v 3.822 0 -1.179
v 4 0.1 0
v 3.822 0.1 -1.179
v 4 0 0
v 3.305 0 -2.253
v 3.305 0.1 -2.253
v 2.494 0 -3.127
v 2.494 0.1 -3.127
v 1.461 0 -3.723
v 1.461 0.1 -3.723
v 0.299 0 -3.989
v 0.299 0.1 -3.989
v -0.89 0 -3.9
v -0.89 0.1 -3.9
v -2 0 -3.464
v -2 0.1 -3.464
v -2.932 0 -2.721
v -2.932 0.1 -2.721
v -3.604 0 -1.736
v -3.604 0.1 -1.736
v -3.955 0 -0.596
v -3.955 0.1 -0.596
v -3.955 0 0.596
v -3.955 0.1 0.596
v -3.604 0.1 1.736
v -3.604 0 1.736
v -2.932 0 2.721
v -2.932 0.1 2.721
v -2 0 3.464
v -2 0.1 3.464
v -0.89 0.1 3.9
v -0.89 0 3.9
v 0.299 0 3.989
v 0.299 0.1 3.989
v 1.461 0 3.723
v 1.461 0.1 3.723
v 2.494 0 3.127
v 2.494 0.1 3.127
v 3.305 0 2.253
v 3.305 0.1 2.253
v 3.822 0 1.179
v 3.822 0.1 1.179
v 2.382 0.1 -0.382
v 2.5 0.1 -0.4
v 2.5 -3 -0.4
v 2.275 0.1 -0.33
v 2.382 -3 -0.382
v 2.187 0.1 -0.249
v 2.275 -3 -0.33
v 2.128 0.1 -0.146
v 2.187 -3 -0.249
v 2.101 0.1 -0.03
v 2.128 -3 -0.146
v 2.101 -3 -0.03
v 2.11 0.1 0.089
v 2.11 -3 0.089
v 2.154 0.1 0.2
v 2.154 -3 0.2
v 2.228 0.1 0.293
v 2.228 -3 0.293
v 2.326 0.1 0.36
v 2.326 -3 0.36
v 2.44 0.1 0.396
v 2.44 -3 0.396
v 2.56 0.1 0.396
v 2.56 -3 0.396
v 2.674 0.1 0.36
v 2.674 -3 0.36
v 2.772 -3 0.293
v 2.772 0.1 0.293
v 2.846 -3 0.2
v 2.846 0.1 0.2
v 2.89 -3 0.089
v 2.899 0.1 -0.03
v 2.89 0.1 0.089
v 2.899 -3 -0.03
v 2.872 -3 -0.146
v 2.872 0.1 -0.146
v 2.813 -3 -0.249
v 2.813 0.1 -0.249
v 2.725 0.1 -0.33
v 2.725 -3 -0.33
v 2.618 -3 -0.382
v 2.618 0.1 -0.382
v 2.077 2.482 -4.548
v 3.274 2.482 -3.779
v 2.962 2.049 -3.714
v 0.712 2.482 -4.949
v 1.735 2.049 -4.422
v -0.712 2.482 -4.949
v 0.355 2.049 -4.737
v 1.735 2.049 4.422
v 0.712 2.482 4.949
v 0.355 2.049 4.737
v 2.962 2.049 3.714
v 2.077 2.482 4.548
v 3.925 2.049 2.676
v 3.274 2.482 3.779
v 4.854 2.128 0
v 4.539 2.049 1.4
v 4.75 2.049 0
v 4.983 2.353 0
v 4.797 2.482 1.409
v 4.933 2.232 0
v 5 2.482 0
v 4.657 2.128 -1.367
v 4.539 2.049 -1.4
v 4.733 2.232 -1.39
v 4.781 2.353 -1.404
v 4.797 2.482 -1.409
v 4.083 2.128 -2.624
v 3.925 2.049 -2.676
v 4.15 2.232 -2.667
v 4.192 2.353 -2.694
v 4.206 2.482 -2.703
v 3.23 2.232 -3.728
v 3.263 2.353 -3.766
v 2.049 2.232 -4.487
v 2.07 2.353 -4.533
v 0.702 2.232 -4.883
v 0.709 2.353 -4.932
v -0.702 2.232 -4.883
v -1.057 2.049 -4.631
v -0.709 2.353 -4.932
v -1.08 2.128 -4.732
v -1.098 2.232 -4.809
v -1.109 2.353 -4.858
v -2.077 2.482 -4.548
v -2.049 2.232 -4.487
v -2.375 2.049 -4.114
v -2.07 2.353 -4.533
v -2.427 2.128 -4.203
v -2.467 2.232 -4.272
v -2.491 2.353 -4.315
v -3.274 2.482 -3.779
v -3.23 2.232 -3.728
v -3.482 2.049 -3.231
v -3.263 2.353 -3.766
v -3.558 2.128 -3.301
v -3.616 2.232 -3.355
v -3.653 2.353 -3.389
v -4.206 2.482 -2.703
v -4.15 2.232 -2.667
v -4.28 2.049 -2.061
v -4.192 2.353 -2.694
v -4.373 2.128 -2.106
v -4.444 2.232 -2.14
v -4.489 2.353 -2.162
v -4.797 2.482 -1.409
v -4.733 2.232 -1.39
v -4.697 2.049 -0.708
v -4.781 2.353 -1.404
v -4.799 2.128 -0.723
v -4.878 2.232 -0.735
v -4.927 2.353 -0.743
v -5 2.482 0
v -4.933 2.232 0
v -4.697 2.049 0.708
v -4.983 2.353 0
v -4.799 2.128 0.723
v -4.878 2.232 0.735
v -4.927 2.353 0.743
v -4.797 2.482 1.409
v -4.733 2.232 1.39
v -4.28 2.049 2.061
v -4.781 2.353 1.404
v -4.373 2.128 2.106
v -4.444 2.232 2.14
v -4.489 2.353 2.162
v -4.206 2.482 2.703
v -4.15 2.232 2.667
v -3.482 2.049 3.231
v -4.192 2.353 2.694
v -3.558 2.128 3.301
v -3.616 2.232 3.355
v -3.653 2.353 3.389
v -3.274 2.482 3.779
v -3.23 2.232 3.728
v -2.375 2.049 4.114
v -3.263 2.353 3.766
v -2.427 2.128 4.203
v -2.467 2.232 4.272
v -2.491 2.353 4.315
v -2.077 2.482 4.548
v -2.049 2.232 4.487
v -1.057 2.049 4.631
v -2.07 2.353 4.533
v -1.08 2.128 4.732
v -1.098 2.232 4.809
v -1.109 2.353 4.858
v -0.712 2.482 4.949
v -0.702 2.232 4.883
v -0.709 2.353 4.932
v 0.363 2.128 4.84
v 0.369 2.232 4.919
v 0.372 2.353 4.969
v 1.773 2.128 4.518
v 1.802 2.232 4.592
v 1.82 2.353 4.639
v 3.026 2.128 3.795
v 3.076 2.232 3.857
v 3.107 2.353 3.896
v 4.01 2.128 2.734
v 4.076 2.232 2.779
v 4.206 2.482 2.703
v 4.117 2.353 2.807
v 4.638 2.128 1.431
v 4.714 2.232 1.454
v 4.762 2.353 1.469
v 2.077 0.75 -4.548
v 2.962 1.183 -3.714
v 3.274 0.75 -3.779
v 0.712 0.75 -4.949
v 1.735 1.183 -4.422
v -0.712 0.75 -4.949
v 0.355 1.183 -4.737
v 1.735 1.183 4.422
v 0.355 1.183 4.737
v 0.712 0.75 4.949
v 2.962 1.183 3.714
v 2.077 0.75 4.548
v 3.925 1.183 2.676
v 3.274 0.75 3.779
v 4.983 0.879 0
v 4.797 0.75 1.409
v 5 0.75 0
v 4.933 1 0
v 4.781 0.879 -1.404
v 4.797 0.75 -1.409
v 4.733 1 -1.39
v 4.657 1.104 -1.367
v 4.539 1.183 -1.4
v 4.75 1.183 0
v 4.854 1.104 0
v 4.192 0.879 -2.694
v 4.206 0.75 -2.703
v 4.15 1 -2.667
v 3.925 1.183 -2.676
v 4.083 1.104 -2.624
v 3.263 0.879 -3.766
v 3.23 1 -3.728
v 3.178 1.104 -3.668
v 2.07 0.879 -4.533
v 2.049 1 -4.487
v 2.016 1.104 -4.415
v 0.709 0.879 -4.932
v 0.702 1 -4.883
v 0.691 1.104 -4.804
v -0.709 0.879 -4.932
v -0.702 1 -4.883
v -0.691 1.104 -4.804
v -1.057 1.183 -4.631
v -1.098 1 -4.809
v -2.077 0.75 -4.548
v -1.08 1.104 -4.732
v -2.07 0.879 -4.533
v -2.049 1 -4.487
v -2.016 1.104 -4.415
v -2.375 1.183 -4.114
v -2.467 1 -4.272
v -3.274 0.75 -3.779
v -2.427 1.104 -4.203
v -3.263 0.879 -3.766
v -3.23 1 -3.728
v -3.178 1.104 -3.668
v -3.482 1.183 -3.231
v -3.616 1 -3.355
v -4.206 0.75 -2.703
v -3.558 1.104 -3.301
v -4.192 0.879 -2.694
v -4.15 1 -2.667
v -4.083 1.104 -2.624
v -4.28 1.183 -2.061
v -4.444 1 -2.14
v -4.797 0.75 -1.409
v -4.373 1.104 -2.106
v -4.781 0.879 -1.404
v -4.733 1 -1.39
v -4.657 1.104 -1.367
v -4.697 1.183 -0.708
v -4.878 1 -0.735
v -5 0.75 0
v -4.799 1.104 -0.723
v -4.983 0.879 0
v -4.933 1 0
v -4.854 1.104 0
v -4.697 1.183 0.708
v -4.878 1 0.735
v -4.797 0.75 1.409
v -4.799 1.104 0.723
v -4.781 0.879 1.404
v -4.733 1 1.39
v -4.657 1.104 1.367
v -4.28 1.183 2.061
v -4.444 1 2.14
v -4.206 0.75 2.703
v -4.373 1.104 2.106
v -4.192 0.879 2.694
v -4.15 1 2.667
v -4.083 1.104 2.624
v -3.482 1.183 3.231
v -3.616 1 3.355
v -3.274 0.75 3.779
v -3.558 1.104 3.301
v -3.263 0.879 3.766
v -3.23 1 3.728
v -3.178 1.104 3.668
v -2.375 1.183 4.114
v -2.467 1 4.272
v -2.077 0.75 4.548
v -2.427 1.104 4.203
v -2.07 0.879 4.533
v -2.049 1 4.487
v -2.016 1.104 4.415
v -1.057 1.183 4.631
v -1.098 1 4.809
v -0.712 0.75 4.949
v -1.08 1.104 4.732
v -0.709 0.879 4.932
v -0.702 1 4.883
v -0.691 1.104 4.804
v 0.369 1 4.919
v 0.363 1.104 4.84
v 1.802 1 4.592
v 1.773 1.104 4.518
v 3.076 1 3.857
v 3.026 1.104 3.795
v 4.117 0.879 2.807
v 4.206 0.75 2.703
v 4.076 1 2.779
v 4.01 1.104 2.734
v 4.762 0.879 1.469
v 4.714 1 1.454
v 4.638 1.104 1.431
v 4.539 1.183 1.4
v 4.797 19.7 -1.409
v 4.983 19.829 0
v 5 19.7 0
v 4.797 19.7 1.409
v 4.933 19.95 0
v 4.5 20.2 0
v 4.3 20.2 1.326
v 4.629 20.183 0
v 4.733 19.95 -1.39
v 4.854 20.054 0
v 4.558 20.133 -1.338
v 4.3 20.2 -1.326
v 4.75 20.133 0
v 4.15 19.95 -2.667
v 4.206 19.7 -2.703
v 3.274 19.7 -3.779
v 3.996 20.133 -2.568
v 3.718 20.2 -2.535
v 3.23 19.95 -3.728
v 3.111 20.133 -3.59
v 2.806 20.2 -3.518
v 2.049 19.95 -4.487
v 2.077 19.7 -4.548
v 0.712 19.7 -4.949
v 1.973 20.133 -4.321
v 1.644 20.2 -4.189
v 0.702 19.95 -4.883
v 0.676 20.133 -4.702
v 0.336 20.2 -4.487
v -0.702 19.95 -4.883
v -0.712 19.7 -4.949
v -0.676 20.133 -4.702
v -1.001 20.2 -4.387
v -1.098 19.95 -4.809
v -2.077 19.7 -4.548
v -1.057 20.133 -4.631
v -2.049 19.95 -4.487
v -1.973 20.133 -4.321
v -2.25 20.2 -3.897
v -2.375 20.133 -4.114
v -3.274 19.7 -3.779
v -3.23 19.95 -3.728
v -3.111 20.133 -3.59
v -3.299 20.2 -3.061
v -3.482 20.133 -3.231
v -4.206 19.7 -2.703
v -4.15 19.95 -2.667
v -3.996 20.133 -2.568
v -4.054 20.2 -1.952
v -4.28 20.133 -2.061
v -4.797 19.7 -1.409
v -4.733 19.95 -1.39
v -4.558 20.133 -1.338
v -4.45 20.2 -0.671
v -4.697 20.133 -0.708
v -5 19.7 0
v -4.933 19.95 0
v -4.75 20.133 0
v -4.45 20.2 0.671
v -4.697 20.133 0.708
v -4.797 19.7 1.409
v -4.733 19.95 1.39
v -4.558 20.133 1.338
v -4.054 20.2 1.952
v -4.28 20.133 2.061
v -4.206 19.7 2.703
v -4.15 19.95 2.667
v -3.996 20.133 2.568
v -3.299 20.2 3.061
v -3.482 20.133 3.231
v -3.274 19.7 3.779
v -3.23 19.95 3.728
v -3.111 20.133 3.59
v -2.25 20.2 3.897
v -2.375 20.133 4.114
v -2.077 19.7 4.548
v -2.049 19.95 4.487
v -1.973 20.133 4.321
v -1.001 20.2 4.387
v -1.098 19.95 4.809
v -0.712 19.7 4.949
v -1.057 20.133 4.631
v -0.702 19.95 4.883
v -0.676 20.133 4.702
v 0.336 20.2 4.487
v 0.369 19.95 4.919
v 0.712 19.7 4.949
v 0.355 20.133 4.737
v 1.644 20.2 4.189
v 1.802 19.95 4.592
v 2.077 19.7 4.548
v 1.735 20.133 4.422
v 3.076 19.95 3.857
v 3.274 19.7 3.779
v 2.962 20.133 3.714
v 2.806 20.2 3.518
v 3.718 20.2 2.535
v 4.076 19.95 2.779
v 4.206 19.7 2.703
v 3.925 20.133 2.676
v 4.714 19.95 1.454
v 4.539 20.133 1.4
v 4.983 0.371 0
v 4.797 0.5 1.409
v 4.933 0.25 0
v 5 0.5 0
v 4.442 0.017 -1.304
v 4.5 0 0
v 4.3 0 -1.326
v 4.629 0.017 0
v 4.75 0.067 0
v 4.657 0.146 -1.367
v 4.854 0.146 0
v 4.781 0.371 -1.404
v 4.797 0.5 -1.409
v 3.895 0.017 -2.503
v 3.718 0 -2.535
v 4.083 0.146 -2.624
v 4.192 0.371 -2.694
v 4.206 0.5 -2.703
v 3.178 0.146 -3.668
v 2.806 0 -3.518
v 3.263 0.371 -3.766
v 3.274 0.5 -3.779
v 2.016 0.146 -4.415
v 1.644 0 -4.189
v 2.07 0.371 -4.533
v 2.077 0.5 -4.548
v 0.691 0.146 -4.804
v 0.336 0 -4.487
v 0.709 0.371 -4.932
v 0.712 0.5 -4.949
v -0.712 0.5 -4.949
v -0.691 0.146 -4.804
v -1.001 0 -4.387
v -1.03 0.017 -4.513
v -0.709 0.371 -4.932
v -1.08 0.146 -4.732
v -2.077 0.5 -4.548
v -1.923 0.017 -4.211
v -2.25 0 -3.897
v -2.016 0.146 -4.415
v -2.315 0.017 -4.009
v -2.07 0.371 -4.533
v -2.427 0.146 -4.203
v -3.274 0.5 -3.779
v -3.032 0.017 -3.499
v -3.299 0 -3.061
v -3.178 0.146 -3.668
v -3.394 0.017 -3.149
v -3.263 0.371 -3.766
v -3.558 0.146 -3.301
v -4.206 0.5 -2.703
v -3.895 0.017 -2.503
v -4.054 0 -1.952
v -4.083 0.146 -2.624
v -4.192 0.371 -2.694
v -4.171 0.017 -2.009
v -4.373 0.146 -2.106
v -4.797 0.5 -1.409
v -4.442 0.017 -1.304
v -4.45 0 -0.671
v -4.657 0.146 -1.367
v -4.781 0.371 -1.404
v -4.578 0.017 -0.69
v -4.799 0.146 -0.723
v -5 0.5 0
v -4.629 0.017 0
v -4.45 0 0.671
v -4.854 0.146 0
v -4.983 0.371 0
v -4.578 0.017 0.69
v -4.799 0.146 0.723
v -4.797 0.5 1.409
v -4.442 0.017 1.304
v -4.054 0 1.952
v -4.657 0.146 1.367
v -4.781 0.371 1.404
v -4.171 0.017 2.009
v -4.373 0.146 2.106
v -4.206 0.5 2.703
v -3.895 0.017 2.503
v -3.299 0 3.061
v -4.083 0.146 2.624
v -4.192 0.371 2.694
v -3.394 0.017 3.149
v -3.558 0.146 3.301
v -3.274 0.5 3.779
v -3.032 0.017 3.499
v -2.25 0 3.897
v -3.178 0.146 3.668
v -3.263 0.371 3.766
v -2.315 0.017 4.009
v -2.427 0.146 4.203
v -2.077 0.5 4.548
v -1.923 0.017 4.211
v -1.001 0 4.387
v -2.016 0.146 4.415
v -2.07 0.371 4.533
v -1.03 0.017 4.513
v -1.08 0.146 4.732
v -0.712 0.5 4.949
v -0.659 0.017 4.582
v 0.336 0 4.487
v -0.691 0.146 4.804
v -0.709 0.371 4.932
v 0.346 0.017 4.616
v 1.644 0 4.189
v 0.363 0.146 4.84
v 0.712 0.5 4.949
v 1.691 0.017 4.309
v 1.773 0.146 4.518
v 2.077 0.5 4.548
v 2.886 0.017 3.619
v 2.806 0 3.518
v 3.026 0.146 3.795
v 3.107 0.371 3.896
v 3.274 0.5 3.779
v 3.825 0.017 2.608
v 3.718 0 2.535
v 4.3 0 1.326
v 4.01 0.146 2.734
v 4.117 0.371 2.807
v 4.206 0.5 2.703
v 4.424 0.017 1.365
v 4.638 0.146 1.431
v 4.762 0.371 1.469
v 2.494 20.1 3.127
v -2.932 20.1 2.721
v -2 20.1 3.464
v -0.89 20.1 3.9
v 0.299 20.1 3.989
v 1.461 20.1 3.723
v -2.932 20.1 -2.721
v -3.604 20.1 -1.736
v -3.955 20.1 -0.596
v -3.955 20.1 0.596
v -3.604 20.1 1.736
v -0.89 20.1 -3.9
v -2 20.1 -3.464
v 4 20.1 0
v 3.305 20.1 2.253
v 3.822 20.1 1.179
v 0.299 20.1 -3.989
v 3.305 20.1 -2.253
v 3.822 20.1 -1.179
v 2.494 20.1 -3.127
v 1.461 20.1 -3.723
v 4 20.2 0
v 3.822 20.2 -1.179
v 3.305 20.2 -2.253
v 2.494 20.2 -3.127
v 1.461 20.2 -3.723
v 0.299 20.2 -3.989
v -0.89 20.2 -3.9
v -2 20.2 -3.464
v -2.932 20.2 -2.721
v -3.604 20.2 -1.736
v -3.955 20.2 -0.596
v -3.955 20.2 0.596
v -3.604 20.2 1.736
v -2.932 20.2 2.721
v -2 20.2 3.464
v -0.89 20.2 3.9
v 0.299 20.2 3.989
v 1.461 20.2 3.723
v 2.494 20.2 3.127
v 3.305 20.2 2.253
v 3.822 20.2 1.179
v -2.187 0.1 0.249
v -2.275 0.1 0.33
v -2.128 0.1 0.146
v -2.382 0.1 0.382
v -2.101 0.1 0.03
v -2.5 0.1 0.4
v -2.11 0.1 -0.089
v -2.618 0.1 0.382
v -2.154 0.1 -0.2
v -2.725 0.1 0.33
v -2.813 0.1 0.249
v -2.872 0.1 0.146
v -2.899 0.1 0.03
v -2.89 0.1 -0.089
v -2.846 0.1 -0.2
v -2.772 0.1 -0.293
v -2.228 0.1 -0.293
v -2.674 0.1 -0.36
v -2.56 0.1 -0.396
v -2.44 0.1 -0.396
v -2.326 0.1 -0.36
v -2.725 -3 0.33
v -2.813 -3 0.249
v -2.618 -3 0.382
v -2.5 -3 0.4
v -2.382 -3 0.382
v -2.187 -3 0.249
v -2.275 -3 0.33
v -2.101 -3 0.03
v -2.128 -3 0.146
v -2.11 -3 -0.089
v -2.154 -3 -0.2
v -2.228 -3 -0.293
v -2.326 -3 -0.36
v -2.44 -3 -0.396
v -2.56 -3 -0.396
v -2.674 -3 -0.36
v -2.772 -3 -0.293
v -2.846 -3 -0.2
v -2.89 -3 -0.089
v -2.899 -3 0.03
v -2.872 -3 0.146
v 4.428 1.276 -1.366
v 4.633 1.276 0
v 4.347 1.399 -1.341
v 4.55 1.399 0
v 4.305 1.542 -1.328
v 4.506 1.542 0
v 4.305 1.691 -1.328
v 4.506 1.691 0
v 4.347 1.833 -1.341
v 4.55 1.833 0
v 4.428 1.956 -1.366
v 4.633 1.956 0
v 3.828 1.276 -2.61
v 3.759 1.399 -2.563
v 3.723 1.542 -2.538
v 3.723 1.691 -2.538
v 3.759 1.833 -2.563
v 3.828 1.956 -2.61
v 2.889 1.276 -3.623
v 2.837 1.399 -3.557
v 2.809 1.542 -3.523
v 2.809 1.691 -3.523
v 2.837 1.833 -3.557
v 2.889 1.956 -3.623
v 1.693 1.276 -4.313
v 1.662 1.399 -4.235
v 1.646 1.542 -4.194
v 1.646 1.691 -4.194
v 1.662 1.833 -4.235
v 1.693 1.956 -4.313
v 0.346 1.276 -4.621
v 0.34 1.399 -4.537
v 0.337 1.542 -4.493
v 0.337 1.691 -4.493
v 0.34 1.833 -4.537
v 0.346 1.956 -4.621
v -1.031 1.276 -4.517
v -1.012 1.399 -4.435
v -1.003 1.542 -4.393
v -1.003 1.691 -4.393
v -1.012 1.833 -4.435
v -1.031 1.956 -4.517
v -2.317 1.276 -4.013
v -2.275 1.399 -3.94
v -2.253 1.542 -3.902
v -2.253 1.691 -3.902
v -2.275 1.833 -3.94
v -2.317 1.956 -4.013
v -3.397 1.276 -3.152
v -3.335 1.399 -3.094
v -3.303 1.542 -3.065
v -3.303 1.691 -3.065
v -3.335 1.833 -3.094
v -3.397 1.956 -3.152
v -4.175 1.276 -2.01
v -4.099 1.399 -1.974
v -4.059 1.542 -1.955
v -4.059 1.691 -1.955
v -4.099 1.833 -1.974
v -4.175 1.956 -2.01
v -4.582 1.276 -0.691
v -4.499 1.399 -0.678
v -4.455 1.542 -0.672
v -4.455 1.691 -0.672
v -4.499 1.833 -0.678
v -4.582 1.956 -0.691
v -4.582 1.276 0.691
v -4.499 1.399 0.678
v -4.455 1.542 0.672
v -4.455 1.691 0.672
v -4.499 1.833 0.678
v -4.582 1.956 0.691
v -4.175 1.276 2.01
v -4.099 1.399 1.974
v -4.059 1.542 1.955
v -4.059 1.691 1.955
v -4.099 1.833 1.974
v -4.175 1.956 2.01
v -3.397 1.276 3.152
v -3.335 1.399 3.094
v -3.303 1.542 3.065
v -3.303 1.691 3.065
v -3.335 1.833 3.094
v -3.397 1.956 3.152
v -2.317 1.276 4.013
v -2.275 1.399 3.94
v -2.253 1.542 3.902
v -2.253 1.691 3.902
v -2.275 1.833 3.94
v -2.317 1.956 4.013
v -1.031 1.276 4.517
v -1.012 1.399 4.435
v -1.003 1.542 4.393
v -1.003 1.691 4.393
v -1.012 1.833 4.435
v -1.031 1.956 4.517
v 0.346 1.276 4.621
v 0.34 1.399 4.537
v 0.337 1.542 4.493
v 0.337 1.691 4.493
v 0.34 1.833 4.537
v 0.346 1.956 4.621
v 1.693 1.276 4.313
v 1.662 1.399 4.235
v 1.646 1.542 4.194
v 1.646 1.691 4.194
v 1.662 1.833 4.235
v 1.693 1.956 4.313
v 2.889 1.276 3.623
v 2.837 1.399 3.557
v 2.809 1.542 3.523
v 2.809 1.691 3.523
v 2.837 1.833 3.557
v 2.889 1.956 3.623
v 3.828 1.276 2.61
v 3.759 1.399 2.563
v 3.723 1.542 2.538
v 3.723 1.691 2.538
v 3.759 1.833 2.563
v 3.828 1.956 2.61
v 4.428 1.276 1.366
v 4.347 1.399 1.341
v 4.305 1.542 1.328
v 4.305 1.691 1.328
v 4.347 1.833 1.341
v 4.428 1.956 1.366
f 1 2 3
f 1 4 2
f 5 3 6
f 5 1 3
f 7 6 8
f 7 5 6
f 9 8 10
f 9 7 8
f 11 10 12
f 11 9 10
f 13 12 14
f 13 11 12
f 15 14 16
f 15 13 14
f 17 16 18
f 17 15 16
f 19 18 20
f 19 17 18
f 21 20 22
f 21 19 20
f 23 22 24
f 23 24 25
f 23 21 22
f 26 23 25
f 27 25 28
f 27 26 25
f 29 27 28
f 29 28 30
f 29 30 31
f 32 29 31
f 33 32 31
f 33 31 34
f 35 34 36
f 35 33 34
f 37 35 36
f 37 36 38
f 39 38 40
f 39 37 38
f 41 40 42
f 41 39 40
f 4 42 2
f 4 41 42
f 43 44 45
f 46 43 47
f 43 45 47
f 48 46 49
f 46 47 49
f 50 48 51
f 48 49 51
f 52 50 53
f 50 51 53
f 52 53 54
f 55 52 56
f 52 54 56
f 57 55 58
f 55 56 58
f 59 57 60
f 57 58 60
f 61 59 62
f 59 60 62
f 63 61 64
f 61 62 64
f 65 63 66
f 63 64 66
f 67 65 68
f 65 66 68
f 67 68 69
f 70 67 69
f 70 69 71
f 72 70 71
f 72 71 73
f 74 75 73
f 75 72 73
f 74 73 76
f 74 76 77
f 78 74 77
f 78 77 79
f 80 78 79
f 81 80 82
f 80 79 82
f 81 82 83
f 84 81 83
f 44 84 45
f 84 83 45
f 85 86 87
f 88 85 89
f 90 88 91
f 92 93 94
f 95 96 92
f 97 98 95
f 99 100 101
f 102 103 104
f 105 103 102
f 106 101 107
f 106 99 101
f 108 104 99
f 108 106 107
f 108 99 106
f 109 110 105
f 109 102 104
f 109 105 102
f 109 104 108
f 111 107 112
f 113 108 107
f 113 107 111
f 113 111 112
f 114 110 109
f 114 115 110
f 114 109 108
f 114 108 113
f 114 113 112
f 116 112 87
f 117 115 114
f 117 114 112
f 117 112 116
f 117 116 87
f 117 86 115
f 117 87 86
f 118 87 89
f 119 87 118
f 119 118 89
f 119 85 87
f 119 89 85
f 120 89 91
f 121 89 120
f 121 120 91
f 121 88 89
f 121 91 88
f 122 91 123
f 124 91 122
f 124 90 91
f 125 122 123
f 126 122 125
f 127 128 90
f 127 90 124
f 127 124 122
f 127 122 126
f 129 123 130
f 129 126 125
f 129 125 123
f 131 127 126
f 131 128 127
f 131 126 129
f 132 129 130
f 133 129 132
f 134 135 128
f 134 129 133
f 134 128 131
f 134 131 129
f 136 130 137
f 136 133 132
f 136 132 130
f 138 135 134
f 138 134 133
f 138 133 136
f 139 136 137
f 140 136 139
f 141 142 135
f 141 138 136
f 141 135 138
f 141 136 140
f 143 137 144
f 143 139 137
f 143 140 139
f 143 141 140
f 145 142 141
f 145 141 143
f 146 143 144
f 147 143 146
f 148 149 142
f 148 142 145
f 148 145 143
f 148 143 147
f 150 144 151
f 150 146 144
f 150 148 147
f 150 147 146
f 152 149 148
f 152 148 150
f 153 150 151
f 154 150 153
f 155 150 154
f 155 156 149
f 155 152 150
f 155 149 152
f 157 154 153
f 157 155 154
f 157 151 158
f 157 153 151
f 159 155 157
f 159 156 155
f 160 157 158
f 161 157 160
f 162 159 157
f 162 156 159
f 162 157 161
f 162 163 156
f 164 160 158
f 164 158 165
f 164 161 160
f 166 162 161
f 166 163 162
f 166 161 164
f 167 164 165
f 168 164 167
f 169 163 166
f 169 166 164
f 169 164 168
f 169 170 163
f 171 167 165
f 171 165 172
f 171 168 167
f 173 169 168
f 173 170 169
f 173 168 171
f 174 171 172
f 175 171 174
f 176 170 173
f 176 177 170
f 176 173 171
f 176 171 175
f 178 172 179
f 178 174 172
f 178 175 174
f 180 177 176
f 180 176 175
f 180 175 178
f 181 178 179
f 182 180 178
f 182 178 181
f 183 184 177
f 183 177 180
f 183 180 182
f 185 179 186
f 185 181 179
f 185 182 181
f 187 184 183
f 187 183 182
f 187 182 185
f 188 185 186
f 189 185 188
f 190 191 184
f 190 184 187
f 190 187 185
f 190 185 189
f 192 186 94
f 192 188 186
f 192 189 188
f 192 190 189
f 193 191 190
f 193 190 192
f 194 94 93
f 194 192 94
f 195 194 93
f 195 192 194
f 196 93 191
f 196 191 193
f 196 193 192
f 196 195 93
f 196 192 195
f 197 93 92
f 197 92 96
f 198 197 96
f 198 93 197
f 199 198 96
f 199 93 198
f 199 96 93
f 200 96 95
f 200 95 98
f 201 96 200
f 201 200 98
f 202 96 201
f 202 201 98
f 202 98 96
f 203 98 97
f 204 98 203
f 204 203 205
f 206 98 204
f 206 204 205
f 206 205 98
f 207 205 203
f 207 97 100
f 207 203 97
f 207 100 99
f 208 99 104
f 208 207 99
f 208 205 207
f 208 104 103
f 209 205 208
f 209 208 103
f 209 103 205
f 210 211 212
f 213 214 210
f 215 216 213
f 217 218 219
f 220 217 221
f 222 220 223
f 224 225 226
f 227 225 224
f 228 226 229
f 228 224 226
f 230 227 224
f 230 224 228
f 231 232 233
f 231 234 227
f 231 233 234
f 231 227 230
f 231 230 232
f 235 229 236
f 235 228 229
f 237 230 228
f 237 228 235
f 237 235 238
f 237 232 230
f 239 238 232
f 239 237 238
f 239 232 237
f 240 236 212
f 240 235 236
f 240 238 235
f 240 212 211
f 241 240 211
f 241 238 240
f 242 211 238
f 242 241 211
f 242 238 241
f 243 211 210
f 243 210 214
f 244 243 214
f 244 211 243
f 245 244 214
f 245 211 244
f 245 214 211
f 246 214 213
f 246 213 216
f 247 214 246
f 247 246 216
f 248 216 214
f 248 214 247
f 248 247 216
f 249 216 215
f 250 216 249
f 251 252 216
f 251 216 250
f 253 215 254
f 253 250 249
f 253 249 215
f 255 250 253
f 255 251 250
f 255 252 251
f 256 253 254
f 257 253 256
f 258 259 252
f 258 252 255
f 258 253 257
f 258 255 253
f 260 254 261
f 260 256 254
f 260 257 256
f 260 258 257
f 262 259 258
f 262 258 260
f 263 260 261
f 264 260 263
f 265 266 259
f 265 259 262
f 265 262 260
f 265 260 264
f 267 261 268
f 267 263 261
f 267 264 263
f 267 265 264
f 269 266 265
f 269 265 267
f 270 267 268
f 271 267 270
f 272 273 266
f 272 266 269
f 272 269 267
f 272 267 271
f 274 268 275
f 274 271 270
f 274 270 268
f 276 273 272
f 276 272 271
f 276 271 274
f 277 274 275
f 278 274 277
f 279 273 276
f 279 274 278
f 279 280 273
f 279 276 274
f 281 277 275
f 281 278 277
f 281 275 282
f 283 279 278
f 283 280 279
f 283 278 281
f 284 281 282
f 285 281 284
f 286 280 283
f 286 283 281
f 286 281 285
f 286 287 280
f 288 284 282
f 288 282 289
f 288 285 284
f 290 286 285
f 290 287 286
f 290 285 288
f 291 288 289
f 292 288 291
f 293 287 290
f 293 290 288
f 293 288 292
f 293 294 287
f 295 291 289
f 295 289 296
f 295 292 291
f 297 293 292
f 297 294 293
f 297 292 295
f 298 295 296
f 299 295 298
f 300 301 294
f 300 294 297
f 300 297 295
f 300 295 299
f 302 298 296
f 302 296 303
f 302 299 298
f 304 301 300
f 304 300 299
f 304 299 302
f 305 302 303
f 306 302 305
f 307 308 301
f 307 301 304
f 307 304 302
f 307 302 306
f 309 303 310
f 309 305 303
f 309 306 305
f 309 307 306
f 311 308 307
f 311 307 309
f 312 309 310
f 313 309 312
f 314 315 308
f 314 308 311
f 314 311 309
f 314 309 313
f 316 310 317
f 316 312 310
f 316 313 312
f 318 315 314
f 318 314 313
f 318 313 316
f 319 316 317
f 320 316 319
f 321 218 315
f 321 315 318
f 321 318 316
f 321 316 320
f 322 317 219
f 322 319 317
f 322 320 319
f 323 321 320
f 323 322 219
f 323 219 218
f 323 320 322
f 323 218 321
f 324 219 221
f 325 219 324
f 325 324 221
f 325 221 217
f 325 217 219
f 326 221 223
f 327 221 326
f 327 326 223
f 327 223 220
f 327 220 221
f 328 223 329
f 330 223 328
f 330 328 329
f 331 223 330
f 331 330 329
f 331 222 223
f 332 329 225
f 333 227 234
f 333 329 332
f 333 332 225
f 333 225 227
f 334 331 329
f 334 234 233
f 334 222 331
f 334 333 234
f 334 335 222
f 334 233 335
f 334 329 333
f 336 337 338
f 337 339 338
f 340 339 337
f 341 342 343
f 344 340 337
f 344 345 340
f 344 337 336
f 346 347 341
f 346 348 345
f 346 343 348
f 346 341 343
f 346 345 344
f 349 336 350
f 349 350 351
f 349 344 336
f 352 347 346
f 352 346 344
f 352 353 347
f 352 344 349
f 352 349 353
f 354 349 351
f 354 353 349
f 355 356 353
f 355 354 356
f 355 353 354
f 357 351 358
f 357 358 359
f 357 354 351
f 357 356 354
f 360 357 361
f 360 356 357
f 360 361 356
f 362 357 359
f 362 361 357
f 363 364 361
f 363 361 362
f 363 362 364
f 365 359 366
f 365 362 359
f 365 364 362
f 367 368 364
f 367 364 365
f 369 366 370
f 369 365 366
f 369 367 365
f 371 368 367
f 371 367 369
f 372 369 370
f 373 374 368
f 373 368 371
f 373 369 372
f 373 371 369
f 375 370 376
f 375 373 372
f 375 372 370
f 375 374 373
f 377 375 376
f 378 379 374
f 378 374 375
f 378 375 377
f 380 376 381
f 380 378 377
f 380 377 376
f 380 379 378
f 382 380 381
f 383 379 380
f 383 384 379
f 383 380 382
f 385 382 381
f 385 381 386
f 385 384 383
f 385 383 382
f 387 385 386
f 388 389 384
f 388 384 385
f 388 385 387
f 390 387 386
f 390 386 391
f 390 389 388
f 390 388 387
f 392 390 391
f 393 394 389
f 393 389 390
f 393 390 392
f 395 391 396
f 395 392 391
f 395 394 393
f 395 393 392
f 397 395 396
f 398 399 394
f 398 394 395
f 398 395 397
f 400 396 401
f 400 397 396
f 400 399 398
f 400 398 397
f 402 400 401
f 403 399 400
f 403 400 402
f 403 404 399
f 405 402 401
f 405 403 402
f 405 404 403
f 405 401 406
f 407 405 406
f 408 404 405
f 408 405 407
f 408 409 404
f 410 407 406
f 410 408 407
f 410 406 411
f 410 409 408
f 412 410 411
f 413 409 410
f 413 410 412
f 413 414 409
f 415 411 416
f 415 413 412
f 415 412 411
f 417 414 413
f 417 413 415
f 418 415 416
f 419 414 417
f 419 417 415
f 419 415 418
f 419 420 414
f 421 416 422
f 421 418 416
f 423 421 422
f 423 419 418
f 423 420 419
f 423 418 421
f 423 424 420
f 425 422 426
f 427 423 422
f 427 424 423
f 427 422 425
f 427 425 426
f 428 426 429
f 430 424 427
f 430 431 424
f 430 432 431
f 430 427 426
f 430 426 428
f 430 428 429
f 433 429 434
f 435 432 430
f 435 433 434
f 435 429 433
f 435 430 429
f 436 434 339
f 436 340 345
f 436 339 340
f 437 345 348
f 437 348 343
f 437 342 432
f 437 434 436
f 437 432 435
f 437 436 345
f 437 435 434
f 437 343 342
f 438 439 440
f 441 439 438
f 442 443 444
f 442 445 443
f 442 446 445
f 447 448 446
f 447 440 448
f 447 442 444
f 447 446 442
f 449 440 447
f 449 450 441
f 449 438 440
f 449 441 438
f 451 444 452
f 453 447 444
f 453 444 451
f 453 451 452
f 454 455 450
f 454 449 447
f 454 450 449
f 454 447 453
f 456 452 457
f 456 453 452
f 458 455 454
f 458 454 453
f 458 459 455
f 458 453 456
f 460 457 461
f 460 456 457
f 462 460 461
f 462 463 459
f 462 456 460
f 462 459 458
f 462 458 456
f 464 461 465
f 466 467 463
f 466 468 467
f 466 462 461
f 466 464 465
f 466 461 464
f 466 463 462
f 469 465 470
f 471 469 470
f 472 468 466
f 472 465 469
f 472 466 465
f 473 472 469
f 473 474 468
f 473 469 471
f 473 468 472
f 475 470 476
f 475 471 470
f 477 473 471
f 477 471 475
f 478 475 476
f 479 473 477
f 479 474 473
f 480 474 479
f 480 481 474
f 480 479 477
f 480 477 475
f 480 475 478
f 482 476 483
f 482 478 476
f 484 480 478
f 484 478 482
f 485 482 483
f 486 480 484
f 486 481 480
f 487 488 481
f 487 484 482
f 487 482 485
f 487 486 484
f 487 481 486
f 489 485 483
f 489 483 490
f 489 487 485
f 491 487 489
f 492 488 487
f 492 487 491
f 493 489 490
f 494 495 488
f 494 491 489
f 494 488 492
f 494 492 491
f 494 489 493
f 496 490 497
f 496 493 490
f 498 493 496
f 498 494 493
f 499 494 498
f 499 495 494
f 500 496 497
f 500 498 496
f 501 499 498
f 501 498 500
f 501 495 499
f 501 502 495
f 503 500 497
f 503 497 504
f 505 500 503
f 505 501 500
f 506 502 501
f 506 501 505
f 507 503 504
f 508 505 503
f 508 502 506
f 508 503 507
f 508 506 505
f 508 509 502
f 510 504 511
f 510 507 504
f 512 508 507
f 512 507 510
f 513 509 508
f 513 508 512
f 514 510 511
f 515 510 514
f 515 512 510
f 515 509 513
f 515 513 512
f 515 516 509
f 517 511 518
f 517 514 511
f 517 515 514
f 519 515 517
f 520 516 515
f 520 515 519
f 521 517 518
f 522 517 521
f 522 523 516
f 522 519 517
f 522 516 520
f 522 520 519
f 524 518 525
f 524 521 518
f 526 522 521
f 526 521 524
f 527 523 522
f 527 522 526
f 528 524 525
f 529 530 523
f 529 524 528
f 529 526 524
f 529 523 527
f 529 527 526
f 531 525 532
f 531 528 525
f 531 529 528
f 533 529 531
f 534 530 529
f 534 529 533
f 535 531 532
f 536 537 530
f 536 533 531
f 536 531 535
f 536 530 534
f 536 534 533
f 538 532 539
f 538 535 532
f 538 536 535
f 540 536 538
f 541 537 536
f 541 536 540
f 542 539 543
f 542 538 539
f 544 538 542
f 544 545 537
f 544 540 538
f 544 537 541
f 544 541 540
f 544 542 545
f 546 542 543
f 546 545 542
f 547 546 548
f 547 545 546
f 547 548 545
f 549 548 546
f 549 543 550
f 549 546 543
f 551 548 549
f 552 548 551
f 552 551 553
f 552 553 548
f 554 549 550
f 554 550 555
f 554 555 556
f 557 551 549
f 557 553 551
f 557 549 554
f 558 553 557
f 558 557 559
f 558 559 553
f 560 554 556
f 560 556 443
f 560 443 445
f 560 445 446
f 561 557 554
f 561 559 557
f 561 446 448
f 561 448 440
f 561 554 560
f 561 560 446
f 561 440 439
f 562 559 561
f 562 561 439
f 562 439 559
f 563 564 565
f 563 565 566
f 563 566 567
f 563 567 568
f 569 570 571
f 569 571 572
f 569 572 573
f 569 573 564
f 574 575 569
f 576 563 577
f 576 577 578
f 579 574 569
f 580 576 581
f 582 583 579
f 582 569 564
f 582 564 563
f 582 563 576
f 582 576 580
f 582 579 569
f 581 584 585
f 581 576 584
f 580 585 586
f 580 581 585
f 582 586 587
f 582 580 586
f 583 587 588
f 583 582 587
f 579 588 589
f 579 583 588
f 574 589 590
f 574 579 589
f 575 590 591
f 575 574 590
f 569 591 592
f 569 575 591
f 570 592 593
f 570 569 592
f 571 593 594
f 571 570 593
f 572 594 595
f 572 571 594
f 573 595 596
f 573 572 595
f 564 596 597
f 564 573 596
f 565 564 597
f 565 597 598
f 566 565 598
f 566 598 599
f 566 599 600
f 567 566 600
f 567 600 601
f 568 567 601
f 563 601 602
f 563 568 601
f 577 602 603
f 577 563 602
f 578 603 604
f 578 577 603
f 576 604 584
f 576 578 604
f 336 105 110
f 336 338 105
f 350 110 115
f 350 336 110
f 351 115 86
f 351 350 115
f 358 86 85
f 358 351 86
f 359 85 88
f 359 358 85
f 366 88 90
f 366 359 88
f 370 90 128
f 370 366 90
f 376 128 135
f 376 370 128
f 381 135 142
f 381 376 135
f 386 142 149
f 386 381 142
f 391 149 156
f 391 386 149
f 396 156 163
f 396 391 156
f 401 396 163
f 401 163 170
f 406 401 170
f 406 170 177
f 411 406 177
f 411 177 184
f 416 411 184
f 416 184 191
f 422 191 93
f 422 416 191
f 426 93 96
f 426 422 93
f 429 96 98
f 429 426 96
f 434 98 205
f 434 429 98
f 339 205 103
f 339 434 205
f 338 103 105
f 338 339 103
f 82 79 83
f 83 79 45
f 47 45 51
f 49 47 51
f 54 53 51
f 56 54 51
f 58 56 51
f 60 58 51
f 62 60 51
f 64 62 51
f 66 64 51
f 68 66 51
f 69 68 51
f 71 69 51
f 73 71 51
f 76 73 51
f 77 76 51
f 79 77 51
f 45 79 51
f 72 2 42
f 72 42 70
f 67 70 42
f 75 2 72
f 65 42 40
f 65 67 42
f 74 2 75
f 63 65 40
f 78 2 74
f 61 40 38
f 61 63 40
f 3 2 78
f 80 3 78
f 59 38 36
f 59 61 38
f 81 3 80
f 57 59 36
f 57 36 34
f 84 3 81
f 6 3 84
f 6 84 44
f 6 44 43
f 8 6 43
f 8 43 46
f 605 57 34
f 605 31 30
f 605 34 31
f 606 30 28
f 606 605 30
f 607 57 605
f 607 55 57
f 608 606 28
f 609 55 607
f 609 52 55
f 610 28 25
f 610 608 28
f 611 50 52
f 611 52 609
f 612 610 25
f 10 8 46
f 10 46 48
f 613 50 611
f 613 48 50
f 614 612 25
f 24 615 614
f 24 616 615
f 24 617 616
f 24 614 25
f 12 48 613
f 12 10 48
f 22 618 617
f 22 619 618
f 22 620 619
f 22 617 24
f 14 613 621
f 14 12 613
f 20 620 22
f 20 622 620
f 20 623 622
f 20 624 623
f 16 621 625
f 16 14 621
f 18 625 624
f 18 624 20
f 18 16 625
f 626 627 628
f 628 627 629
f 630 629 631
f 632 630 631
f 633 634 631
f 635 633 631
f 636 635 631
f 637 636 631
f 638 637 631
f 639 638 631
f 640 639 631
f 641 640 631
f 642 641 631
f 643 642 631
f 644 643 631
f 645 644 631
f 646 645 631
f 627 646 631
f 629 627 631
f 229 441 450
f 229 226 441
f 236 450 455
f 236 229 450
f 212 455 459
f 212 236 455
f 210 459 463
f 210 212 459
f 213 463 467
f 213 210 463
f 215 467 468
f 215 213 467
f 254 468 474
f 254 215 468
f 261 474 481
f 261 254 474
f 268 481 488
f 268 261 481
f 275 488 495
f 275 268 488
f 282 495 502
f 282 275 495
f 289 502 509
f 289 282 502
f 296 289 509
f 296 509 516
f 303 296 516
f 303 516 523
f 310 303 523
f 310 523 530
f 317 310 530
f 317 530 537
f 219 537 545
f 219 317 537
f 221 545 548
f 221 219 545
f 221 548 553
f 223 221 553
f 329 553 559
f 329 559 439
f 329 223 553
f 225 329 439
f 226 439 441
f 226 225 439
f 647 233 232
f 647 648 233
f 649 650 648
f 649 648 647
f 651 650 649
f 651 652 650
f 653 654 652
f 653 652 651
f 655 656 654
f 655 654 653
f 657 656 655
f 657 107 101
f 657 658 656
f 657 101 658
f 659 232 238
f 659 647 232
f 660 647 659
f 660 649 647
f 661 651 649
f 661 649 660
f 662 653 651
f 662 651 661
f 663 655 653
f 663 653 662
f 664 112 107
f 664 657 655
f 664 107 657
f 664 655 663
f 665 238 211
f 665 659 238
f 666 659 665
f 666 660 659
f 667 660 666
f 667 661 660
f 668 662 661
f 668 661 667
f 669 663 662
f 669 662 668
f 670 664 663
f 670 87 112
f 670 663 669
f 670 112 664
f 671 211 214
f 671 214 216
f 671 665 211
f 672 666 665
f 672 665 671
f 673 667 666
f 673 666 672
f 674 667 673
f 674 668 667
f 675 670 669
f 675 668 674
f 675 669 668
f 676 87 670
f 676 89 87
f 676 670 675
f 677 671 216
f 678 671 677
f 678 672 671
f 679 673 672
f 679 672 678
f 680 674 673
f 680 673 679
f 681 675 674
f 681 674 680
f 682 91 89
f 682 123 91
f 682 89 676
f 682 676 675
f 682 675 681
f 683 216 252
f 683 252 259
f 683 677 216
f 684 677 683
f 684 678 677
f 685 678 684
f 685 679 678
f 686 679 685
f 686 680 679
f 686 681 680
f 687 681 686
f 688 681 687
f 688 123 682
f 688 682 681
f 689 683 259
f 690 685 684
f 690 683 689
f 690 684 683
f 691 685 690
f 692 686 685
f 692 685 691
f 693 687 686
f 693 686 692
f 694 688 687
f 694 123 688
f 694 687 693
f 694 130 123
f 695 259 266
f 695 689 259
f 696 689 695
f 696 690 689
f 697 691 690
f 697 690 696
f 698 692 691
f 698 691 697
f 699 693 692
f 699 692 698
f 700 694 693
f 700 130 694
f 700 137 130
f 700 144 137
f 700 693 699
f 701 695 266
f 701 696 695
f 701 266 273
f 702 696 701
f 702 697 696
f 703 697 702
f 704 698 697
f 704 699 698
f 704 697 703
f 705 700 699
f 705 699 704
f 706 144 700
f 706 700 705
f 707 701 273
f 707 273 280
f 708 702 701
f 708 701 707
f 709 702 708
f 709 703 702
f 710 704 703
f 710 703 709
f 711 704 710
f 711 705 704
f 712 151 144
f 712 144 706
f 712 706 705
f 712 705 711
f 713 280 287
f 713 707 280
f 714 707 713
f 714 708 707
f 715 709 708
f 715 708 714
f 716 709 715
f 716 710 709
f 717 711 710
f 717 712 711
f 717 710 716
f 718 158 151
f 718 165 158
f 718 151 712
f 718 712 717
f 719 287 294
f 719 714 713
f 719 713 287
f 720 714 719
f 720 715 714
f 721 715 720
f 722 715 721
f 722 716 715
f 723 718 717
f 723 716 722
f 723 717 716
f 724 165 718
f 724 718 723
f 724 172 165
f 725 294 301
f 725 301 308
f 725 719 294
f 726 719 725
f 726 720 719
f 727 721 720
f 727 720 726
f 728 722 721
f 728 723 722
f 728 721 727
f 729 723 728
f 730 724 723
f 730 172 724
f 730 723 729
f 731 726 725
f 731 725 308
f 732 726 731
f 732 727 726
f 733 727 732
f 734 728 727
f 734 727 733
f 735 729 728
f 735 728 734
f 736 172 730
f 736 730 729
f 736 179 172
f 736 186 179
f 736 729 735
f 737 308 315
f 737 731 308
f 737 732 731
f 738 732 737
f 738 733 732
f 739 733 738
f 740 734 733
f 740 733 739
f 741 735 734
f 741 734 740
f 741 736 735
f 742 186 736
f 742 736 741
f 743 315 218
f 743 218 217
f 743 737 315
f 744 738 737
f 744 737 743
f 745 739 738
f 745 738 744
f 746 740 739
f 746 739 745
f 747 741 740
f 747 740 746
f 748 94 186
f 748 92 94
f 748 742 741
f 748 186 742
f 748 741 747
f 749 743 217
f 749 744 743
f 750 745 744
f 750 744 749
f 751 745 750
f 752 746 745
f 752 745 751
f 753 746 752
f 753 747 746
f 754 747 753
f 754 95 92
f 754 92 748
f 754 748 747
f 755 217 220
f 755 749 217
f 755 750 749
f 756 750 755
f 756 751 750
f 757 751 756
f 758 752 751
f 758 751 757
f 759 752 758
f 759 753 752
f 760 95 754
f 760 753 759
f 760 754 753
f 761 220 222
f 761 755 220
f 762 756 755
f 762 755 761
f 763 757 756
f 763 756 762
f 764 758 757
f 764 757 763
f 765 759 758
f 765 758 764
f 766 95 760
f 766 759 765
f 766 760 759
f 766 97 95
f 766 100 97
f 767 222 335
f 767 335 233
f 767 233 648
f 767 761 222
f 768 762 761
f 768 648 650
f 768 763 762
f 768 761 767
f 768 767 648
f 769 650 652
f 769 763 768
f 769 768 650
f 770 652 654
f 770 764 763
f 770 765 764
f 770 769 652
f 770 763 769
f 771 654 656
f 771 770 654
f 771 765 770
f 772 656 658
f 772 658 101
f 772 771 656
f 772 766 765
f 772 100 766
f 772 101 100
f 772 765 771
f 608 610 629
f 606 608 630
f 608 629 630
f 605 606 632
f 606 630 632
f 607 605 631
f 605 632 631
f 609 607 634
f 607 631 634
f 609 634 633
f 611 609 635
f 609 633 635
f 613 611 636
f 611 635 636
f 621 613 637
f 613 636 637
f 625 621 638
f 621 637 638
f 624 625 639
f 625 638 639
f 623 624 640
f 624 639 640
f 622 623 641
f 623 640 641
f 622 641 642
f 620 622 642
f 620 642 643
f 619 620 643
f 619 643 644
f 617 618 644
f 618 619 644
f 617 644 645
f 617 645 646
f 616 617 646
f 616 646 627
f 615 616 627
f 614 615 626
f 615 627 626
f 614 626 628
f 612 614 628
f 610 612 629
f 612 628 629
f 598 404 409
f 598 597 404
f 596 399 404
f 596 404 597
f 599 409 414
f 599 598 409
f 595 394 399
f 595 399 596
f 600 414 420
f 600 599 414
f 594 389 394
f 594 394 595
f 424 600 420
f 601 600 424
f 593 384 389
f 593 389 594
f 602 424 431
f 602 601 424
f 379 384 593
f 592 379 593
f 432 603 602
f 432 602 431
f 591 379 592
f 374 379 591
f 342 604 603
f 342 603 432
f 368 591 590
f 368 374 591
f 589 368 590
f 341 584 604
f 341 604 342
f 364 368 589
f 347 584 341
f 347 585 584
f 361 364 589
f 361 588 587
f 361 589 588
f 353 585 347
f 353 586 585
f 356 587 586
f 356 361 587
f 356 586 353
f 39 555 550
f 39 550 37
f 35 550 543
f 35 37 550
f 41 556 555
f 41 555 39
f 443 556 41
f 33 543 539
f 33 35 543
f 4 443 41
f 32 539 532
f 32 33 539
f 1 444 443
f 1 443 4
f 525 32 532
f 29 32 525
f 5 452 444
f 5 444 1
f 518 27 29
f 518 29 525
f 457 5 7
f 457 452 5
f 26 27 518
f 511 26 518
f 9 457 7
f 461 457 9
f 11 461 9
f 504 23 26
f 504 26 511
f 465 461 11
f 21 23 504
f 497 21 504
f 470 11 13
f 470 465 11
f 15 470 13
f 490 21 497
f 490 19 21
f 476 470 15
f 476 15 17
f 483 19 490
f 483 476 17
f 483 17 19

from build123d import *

# Parameters (mm, degrees)
BOSS_EXTRUDE1_DEPTH        = 1
BOSS_EXTRUDE1_DEPTH_BACK   = 3
SKETCH1_R                  = 0.4
BOSS_EXTRUDE1_2_DEPTH      = 1
BOSS_EXTRUDE1_2_DEPTH_BACK = 3


with BuildPart() as part:
    # Sketch1 → Boss-Extrude1 (new, two sides: drawn at the far end of the back side and taken through both)
    with BuildSketch(Plane(origin=(0, 0, 0), x_dir=(1, 0, 0), z_dir=(0, 1, 0)).offset(-BOSS_EXTRUDE1_DEPTH_BACK)):
        with Locations(Location((-2.5, 0, 0), (0, 0, 270))):
            Circle(SKETCH1_R)
    extrude(amount=BOSS_EXTRUDE1_DEPTH + BOSS_EXTRUDE1_DEPTH_BACK)



with BuildPart() as body_2:
    # Sketch1 → Boss-Extrude1 2 (new, two sides: drawn at the far end of the back side and taken through both)
    with BuildSketch(Plane(origin=(0, 0, 0), x_dir=(1, 0, 0), z_dir=(0, 1, 0)).offset(-BOSS_EXTRUDE1_2_DEPTH_BACK)):
        with Locations(Location((2.5, 0, 0), (0, 0, 90))):
            Circle(SKETCH1_R)
    extrude(amount=BOSS_EXTRUDE1_2_DEPTH + BOSS_EXTRUDE1_2_DEPTH_BACK)


with BuildPart() as part_1:
    add(part.part)

    add(body_2.part)  # Revolve1 merges body 2
    # Sketch3 → Revolve1 (revolve)
    with BuildSketch(Plane.XY):
        with BuildLine():
            Line((5, 0.5), (5, 0.75))
            ThreePointArc((5, 0.75), (4.933012702, 1), (4.75, 1.183012702))
            ThreePointArc((4.75, 1.183012702), (4.5, 1.616025404), (4.75, 2.049038106))
            ThreePointArc((4.75, 2.049038106), (4.933012702, 2.232050808), (5, 2.482050808))
            Line((5, 2.482050808), (5, 19.7))
            ThreePointArc((5, 19.7), (4.853553391, 20.053553391), (4.5, 20.2))
            Line((4.5, 20.2), (4, 20.2))
            Line((4, 20.2), (4, 20.1))
            Line((4, 20.1), (0, 20.1))
            Line((0, 20.1), (0, 0.1))
            Line((0, 0.1), (4, 0.1))
            Line((4, 0.1), (4, 0))
            Line((4, 0), (4.5, 0))
            ThreePointArc((4.5, 0), (4.853553391, 0.146446609), (5, 0.5))
        make_face()
    revolve(axis=Axis((0, 0.1, 0), (0, 1, 0)))


solid = part_1.part
